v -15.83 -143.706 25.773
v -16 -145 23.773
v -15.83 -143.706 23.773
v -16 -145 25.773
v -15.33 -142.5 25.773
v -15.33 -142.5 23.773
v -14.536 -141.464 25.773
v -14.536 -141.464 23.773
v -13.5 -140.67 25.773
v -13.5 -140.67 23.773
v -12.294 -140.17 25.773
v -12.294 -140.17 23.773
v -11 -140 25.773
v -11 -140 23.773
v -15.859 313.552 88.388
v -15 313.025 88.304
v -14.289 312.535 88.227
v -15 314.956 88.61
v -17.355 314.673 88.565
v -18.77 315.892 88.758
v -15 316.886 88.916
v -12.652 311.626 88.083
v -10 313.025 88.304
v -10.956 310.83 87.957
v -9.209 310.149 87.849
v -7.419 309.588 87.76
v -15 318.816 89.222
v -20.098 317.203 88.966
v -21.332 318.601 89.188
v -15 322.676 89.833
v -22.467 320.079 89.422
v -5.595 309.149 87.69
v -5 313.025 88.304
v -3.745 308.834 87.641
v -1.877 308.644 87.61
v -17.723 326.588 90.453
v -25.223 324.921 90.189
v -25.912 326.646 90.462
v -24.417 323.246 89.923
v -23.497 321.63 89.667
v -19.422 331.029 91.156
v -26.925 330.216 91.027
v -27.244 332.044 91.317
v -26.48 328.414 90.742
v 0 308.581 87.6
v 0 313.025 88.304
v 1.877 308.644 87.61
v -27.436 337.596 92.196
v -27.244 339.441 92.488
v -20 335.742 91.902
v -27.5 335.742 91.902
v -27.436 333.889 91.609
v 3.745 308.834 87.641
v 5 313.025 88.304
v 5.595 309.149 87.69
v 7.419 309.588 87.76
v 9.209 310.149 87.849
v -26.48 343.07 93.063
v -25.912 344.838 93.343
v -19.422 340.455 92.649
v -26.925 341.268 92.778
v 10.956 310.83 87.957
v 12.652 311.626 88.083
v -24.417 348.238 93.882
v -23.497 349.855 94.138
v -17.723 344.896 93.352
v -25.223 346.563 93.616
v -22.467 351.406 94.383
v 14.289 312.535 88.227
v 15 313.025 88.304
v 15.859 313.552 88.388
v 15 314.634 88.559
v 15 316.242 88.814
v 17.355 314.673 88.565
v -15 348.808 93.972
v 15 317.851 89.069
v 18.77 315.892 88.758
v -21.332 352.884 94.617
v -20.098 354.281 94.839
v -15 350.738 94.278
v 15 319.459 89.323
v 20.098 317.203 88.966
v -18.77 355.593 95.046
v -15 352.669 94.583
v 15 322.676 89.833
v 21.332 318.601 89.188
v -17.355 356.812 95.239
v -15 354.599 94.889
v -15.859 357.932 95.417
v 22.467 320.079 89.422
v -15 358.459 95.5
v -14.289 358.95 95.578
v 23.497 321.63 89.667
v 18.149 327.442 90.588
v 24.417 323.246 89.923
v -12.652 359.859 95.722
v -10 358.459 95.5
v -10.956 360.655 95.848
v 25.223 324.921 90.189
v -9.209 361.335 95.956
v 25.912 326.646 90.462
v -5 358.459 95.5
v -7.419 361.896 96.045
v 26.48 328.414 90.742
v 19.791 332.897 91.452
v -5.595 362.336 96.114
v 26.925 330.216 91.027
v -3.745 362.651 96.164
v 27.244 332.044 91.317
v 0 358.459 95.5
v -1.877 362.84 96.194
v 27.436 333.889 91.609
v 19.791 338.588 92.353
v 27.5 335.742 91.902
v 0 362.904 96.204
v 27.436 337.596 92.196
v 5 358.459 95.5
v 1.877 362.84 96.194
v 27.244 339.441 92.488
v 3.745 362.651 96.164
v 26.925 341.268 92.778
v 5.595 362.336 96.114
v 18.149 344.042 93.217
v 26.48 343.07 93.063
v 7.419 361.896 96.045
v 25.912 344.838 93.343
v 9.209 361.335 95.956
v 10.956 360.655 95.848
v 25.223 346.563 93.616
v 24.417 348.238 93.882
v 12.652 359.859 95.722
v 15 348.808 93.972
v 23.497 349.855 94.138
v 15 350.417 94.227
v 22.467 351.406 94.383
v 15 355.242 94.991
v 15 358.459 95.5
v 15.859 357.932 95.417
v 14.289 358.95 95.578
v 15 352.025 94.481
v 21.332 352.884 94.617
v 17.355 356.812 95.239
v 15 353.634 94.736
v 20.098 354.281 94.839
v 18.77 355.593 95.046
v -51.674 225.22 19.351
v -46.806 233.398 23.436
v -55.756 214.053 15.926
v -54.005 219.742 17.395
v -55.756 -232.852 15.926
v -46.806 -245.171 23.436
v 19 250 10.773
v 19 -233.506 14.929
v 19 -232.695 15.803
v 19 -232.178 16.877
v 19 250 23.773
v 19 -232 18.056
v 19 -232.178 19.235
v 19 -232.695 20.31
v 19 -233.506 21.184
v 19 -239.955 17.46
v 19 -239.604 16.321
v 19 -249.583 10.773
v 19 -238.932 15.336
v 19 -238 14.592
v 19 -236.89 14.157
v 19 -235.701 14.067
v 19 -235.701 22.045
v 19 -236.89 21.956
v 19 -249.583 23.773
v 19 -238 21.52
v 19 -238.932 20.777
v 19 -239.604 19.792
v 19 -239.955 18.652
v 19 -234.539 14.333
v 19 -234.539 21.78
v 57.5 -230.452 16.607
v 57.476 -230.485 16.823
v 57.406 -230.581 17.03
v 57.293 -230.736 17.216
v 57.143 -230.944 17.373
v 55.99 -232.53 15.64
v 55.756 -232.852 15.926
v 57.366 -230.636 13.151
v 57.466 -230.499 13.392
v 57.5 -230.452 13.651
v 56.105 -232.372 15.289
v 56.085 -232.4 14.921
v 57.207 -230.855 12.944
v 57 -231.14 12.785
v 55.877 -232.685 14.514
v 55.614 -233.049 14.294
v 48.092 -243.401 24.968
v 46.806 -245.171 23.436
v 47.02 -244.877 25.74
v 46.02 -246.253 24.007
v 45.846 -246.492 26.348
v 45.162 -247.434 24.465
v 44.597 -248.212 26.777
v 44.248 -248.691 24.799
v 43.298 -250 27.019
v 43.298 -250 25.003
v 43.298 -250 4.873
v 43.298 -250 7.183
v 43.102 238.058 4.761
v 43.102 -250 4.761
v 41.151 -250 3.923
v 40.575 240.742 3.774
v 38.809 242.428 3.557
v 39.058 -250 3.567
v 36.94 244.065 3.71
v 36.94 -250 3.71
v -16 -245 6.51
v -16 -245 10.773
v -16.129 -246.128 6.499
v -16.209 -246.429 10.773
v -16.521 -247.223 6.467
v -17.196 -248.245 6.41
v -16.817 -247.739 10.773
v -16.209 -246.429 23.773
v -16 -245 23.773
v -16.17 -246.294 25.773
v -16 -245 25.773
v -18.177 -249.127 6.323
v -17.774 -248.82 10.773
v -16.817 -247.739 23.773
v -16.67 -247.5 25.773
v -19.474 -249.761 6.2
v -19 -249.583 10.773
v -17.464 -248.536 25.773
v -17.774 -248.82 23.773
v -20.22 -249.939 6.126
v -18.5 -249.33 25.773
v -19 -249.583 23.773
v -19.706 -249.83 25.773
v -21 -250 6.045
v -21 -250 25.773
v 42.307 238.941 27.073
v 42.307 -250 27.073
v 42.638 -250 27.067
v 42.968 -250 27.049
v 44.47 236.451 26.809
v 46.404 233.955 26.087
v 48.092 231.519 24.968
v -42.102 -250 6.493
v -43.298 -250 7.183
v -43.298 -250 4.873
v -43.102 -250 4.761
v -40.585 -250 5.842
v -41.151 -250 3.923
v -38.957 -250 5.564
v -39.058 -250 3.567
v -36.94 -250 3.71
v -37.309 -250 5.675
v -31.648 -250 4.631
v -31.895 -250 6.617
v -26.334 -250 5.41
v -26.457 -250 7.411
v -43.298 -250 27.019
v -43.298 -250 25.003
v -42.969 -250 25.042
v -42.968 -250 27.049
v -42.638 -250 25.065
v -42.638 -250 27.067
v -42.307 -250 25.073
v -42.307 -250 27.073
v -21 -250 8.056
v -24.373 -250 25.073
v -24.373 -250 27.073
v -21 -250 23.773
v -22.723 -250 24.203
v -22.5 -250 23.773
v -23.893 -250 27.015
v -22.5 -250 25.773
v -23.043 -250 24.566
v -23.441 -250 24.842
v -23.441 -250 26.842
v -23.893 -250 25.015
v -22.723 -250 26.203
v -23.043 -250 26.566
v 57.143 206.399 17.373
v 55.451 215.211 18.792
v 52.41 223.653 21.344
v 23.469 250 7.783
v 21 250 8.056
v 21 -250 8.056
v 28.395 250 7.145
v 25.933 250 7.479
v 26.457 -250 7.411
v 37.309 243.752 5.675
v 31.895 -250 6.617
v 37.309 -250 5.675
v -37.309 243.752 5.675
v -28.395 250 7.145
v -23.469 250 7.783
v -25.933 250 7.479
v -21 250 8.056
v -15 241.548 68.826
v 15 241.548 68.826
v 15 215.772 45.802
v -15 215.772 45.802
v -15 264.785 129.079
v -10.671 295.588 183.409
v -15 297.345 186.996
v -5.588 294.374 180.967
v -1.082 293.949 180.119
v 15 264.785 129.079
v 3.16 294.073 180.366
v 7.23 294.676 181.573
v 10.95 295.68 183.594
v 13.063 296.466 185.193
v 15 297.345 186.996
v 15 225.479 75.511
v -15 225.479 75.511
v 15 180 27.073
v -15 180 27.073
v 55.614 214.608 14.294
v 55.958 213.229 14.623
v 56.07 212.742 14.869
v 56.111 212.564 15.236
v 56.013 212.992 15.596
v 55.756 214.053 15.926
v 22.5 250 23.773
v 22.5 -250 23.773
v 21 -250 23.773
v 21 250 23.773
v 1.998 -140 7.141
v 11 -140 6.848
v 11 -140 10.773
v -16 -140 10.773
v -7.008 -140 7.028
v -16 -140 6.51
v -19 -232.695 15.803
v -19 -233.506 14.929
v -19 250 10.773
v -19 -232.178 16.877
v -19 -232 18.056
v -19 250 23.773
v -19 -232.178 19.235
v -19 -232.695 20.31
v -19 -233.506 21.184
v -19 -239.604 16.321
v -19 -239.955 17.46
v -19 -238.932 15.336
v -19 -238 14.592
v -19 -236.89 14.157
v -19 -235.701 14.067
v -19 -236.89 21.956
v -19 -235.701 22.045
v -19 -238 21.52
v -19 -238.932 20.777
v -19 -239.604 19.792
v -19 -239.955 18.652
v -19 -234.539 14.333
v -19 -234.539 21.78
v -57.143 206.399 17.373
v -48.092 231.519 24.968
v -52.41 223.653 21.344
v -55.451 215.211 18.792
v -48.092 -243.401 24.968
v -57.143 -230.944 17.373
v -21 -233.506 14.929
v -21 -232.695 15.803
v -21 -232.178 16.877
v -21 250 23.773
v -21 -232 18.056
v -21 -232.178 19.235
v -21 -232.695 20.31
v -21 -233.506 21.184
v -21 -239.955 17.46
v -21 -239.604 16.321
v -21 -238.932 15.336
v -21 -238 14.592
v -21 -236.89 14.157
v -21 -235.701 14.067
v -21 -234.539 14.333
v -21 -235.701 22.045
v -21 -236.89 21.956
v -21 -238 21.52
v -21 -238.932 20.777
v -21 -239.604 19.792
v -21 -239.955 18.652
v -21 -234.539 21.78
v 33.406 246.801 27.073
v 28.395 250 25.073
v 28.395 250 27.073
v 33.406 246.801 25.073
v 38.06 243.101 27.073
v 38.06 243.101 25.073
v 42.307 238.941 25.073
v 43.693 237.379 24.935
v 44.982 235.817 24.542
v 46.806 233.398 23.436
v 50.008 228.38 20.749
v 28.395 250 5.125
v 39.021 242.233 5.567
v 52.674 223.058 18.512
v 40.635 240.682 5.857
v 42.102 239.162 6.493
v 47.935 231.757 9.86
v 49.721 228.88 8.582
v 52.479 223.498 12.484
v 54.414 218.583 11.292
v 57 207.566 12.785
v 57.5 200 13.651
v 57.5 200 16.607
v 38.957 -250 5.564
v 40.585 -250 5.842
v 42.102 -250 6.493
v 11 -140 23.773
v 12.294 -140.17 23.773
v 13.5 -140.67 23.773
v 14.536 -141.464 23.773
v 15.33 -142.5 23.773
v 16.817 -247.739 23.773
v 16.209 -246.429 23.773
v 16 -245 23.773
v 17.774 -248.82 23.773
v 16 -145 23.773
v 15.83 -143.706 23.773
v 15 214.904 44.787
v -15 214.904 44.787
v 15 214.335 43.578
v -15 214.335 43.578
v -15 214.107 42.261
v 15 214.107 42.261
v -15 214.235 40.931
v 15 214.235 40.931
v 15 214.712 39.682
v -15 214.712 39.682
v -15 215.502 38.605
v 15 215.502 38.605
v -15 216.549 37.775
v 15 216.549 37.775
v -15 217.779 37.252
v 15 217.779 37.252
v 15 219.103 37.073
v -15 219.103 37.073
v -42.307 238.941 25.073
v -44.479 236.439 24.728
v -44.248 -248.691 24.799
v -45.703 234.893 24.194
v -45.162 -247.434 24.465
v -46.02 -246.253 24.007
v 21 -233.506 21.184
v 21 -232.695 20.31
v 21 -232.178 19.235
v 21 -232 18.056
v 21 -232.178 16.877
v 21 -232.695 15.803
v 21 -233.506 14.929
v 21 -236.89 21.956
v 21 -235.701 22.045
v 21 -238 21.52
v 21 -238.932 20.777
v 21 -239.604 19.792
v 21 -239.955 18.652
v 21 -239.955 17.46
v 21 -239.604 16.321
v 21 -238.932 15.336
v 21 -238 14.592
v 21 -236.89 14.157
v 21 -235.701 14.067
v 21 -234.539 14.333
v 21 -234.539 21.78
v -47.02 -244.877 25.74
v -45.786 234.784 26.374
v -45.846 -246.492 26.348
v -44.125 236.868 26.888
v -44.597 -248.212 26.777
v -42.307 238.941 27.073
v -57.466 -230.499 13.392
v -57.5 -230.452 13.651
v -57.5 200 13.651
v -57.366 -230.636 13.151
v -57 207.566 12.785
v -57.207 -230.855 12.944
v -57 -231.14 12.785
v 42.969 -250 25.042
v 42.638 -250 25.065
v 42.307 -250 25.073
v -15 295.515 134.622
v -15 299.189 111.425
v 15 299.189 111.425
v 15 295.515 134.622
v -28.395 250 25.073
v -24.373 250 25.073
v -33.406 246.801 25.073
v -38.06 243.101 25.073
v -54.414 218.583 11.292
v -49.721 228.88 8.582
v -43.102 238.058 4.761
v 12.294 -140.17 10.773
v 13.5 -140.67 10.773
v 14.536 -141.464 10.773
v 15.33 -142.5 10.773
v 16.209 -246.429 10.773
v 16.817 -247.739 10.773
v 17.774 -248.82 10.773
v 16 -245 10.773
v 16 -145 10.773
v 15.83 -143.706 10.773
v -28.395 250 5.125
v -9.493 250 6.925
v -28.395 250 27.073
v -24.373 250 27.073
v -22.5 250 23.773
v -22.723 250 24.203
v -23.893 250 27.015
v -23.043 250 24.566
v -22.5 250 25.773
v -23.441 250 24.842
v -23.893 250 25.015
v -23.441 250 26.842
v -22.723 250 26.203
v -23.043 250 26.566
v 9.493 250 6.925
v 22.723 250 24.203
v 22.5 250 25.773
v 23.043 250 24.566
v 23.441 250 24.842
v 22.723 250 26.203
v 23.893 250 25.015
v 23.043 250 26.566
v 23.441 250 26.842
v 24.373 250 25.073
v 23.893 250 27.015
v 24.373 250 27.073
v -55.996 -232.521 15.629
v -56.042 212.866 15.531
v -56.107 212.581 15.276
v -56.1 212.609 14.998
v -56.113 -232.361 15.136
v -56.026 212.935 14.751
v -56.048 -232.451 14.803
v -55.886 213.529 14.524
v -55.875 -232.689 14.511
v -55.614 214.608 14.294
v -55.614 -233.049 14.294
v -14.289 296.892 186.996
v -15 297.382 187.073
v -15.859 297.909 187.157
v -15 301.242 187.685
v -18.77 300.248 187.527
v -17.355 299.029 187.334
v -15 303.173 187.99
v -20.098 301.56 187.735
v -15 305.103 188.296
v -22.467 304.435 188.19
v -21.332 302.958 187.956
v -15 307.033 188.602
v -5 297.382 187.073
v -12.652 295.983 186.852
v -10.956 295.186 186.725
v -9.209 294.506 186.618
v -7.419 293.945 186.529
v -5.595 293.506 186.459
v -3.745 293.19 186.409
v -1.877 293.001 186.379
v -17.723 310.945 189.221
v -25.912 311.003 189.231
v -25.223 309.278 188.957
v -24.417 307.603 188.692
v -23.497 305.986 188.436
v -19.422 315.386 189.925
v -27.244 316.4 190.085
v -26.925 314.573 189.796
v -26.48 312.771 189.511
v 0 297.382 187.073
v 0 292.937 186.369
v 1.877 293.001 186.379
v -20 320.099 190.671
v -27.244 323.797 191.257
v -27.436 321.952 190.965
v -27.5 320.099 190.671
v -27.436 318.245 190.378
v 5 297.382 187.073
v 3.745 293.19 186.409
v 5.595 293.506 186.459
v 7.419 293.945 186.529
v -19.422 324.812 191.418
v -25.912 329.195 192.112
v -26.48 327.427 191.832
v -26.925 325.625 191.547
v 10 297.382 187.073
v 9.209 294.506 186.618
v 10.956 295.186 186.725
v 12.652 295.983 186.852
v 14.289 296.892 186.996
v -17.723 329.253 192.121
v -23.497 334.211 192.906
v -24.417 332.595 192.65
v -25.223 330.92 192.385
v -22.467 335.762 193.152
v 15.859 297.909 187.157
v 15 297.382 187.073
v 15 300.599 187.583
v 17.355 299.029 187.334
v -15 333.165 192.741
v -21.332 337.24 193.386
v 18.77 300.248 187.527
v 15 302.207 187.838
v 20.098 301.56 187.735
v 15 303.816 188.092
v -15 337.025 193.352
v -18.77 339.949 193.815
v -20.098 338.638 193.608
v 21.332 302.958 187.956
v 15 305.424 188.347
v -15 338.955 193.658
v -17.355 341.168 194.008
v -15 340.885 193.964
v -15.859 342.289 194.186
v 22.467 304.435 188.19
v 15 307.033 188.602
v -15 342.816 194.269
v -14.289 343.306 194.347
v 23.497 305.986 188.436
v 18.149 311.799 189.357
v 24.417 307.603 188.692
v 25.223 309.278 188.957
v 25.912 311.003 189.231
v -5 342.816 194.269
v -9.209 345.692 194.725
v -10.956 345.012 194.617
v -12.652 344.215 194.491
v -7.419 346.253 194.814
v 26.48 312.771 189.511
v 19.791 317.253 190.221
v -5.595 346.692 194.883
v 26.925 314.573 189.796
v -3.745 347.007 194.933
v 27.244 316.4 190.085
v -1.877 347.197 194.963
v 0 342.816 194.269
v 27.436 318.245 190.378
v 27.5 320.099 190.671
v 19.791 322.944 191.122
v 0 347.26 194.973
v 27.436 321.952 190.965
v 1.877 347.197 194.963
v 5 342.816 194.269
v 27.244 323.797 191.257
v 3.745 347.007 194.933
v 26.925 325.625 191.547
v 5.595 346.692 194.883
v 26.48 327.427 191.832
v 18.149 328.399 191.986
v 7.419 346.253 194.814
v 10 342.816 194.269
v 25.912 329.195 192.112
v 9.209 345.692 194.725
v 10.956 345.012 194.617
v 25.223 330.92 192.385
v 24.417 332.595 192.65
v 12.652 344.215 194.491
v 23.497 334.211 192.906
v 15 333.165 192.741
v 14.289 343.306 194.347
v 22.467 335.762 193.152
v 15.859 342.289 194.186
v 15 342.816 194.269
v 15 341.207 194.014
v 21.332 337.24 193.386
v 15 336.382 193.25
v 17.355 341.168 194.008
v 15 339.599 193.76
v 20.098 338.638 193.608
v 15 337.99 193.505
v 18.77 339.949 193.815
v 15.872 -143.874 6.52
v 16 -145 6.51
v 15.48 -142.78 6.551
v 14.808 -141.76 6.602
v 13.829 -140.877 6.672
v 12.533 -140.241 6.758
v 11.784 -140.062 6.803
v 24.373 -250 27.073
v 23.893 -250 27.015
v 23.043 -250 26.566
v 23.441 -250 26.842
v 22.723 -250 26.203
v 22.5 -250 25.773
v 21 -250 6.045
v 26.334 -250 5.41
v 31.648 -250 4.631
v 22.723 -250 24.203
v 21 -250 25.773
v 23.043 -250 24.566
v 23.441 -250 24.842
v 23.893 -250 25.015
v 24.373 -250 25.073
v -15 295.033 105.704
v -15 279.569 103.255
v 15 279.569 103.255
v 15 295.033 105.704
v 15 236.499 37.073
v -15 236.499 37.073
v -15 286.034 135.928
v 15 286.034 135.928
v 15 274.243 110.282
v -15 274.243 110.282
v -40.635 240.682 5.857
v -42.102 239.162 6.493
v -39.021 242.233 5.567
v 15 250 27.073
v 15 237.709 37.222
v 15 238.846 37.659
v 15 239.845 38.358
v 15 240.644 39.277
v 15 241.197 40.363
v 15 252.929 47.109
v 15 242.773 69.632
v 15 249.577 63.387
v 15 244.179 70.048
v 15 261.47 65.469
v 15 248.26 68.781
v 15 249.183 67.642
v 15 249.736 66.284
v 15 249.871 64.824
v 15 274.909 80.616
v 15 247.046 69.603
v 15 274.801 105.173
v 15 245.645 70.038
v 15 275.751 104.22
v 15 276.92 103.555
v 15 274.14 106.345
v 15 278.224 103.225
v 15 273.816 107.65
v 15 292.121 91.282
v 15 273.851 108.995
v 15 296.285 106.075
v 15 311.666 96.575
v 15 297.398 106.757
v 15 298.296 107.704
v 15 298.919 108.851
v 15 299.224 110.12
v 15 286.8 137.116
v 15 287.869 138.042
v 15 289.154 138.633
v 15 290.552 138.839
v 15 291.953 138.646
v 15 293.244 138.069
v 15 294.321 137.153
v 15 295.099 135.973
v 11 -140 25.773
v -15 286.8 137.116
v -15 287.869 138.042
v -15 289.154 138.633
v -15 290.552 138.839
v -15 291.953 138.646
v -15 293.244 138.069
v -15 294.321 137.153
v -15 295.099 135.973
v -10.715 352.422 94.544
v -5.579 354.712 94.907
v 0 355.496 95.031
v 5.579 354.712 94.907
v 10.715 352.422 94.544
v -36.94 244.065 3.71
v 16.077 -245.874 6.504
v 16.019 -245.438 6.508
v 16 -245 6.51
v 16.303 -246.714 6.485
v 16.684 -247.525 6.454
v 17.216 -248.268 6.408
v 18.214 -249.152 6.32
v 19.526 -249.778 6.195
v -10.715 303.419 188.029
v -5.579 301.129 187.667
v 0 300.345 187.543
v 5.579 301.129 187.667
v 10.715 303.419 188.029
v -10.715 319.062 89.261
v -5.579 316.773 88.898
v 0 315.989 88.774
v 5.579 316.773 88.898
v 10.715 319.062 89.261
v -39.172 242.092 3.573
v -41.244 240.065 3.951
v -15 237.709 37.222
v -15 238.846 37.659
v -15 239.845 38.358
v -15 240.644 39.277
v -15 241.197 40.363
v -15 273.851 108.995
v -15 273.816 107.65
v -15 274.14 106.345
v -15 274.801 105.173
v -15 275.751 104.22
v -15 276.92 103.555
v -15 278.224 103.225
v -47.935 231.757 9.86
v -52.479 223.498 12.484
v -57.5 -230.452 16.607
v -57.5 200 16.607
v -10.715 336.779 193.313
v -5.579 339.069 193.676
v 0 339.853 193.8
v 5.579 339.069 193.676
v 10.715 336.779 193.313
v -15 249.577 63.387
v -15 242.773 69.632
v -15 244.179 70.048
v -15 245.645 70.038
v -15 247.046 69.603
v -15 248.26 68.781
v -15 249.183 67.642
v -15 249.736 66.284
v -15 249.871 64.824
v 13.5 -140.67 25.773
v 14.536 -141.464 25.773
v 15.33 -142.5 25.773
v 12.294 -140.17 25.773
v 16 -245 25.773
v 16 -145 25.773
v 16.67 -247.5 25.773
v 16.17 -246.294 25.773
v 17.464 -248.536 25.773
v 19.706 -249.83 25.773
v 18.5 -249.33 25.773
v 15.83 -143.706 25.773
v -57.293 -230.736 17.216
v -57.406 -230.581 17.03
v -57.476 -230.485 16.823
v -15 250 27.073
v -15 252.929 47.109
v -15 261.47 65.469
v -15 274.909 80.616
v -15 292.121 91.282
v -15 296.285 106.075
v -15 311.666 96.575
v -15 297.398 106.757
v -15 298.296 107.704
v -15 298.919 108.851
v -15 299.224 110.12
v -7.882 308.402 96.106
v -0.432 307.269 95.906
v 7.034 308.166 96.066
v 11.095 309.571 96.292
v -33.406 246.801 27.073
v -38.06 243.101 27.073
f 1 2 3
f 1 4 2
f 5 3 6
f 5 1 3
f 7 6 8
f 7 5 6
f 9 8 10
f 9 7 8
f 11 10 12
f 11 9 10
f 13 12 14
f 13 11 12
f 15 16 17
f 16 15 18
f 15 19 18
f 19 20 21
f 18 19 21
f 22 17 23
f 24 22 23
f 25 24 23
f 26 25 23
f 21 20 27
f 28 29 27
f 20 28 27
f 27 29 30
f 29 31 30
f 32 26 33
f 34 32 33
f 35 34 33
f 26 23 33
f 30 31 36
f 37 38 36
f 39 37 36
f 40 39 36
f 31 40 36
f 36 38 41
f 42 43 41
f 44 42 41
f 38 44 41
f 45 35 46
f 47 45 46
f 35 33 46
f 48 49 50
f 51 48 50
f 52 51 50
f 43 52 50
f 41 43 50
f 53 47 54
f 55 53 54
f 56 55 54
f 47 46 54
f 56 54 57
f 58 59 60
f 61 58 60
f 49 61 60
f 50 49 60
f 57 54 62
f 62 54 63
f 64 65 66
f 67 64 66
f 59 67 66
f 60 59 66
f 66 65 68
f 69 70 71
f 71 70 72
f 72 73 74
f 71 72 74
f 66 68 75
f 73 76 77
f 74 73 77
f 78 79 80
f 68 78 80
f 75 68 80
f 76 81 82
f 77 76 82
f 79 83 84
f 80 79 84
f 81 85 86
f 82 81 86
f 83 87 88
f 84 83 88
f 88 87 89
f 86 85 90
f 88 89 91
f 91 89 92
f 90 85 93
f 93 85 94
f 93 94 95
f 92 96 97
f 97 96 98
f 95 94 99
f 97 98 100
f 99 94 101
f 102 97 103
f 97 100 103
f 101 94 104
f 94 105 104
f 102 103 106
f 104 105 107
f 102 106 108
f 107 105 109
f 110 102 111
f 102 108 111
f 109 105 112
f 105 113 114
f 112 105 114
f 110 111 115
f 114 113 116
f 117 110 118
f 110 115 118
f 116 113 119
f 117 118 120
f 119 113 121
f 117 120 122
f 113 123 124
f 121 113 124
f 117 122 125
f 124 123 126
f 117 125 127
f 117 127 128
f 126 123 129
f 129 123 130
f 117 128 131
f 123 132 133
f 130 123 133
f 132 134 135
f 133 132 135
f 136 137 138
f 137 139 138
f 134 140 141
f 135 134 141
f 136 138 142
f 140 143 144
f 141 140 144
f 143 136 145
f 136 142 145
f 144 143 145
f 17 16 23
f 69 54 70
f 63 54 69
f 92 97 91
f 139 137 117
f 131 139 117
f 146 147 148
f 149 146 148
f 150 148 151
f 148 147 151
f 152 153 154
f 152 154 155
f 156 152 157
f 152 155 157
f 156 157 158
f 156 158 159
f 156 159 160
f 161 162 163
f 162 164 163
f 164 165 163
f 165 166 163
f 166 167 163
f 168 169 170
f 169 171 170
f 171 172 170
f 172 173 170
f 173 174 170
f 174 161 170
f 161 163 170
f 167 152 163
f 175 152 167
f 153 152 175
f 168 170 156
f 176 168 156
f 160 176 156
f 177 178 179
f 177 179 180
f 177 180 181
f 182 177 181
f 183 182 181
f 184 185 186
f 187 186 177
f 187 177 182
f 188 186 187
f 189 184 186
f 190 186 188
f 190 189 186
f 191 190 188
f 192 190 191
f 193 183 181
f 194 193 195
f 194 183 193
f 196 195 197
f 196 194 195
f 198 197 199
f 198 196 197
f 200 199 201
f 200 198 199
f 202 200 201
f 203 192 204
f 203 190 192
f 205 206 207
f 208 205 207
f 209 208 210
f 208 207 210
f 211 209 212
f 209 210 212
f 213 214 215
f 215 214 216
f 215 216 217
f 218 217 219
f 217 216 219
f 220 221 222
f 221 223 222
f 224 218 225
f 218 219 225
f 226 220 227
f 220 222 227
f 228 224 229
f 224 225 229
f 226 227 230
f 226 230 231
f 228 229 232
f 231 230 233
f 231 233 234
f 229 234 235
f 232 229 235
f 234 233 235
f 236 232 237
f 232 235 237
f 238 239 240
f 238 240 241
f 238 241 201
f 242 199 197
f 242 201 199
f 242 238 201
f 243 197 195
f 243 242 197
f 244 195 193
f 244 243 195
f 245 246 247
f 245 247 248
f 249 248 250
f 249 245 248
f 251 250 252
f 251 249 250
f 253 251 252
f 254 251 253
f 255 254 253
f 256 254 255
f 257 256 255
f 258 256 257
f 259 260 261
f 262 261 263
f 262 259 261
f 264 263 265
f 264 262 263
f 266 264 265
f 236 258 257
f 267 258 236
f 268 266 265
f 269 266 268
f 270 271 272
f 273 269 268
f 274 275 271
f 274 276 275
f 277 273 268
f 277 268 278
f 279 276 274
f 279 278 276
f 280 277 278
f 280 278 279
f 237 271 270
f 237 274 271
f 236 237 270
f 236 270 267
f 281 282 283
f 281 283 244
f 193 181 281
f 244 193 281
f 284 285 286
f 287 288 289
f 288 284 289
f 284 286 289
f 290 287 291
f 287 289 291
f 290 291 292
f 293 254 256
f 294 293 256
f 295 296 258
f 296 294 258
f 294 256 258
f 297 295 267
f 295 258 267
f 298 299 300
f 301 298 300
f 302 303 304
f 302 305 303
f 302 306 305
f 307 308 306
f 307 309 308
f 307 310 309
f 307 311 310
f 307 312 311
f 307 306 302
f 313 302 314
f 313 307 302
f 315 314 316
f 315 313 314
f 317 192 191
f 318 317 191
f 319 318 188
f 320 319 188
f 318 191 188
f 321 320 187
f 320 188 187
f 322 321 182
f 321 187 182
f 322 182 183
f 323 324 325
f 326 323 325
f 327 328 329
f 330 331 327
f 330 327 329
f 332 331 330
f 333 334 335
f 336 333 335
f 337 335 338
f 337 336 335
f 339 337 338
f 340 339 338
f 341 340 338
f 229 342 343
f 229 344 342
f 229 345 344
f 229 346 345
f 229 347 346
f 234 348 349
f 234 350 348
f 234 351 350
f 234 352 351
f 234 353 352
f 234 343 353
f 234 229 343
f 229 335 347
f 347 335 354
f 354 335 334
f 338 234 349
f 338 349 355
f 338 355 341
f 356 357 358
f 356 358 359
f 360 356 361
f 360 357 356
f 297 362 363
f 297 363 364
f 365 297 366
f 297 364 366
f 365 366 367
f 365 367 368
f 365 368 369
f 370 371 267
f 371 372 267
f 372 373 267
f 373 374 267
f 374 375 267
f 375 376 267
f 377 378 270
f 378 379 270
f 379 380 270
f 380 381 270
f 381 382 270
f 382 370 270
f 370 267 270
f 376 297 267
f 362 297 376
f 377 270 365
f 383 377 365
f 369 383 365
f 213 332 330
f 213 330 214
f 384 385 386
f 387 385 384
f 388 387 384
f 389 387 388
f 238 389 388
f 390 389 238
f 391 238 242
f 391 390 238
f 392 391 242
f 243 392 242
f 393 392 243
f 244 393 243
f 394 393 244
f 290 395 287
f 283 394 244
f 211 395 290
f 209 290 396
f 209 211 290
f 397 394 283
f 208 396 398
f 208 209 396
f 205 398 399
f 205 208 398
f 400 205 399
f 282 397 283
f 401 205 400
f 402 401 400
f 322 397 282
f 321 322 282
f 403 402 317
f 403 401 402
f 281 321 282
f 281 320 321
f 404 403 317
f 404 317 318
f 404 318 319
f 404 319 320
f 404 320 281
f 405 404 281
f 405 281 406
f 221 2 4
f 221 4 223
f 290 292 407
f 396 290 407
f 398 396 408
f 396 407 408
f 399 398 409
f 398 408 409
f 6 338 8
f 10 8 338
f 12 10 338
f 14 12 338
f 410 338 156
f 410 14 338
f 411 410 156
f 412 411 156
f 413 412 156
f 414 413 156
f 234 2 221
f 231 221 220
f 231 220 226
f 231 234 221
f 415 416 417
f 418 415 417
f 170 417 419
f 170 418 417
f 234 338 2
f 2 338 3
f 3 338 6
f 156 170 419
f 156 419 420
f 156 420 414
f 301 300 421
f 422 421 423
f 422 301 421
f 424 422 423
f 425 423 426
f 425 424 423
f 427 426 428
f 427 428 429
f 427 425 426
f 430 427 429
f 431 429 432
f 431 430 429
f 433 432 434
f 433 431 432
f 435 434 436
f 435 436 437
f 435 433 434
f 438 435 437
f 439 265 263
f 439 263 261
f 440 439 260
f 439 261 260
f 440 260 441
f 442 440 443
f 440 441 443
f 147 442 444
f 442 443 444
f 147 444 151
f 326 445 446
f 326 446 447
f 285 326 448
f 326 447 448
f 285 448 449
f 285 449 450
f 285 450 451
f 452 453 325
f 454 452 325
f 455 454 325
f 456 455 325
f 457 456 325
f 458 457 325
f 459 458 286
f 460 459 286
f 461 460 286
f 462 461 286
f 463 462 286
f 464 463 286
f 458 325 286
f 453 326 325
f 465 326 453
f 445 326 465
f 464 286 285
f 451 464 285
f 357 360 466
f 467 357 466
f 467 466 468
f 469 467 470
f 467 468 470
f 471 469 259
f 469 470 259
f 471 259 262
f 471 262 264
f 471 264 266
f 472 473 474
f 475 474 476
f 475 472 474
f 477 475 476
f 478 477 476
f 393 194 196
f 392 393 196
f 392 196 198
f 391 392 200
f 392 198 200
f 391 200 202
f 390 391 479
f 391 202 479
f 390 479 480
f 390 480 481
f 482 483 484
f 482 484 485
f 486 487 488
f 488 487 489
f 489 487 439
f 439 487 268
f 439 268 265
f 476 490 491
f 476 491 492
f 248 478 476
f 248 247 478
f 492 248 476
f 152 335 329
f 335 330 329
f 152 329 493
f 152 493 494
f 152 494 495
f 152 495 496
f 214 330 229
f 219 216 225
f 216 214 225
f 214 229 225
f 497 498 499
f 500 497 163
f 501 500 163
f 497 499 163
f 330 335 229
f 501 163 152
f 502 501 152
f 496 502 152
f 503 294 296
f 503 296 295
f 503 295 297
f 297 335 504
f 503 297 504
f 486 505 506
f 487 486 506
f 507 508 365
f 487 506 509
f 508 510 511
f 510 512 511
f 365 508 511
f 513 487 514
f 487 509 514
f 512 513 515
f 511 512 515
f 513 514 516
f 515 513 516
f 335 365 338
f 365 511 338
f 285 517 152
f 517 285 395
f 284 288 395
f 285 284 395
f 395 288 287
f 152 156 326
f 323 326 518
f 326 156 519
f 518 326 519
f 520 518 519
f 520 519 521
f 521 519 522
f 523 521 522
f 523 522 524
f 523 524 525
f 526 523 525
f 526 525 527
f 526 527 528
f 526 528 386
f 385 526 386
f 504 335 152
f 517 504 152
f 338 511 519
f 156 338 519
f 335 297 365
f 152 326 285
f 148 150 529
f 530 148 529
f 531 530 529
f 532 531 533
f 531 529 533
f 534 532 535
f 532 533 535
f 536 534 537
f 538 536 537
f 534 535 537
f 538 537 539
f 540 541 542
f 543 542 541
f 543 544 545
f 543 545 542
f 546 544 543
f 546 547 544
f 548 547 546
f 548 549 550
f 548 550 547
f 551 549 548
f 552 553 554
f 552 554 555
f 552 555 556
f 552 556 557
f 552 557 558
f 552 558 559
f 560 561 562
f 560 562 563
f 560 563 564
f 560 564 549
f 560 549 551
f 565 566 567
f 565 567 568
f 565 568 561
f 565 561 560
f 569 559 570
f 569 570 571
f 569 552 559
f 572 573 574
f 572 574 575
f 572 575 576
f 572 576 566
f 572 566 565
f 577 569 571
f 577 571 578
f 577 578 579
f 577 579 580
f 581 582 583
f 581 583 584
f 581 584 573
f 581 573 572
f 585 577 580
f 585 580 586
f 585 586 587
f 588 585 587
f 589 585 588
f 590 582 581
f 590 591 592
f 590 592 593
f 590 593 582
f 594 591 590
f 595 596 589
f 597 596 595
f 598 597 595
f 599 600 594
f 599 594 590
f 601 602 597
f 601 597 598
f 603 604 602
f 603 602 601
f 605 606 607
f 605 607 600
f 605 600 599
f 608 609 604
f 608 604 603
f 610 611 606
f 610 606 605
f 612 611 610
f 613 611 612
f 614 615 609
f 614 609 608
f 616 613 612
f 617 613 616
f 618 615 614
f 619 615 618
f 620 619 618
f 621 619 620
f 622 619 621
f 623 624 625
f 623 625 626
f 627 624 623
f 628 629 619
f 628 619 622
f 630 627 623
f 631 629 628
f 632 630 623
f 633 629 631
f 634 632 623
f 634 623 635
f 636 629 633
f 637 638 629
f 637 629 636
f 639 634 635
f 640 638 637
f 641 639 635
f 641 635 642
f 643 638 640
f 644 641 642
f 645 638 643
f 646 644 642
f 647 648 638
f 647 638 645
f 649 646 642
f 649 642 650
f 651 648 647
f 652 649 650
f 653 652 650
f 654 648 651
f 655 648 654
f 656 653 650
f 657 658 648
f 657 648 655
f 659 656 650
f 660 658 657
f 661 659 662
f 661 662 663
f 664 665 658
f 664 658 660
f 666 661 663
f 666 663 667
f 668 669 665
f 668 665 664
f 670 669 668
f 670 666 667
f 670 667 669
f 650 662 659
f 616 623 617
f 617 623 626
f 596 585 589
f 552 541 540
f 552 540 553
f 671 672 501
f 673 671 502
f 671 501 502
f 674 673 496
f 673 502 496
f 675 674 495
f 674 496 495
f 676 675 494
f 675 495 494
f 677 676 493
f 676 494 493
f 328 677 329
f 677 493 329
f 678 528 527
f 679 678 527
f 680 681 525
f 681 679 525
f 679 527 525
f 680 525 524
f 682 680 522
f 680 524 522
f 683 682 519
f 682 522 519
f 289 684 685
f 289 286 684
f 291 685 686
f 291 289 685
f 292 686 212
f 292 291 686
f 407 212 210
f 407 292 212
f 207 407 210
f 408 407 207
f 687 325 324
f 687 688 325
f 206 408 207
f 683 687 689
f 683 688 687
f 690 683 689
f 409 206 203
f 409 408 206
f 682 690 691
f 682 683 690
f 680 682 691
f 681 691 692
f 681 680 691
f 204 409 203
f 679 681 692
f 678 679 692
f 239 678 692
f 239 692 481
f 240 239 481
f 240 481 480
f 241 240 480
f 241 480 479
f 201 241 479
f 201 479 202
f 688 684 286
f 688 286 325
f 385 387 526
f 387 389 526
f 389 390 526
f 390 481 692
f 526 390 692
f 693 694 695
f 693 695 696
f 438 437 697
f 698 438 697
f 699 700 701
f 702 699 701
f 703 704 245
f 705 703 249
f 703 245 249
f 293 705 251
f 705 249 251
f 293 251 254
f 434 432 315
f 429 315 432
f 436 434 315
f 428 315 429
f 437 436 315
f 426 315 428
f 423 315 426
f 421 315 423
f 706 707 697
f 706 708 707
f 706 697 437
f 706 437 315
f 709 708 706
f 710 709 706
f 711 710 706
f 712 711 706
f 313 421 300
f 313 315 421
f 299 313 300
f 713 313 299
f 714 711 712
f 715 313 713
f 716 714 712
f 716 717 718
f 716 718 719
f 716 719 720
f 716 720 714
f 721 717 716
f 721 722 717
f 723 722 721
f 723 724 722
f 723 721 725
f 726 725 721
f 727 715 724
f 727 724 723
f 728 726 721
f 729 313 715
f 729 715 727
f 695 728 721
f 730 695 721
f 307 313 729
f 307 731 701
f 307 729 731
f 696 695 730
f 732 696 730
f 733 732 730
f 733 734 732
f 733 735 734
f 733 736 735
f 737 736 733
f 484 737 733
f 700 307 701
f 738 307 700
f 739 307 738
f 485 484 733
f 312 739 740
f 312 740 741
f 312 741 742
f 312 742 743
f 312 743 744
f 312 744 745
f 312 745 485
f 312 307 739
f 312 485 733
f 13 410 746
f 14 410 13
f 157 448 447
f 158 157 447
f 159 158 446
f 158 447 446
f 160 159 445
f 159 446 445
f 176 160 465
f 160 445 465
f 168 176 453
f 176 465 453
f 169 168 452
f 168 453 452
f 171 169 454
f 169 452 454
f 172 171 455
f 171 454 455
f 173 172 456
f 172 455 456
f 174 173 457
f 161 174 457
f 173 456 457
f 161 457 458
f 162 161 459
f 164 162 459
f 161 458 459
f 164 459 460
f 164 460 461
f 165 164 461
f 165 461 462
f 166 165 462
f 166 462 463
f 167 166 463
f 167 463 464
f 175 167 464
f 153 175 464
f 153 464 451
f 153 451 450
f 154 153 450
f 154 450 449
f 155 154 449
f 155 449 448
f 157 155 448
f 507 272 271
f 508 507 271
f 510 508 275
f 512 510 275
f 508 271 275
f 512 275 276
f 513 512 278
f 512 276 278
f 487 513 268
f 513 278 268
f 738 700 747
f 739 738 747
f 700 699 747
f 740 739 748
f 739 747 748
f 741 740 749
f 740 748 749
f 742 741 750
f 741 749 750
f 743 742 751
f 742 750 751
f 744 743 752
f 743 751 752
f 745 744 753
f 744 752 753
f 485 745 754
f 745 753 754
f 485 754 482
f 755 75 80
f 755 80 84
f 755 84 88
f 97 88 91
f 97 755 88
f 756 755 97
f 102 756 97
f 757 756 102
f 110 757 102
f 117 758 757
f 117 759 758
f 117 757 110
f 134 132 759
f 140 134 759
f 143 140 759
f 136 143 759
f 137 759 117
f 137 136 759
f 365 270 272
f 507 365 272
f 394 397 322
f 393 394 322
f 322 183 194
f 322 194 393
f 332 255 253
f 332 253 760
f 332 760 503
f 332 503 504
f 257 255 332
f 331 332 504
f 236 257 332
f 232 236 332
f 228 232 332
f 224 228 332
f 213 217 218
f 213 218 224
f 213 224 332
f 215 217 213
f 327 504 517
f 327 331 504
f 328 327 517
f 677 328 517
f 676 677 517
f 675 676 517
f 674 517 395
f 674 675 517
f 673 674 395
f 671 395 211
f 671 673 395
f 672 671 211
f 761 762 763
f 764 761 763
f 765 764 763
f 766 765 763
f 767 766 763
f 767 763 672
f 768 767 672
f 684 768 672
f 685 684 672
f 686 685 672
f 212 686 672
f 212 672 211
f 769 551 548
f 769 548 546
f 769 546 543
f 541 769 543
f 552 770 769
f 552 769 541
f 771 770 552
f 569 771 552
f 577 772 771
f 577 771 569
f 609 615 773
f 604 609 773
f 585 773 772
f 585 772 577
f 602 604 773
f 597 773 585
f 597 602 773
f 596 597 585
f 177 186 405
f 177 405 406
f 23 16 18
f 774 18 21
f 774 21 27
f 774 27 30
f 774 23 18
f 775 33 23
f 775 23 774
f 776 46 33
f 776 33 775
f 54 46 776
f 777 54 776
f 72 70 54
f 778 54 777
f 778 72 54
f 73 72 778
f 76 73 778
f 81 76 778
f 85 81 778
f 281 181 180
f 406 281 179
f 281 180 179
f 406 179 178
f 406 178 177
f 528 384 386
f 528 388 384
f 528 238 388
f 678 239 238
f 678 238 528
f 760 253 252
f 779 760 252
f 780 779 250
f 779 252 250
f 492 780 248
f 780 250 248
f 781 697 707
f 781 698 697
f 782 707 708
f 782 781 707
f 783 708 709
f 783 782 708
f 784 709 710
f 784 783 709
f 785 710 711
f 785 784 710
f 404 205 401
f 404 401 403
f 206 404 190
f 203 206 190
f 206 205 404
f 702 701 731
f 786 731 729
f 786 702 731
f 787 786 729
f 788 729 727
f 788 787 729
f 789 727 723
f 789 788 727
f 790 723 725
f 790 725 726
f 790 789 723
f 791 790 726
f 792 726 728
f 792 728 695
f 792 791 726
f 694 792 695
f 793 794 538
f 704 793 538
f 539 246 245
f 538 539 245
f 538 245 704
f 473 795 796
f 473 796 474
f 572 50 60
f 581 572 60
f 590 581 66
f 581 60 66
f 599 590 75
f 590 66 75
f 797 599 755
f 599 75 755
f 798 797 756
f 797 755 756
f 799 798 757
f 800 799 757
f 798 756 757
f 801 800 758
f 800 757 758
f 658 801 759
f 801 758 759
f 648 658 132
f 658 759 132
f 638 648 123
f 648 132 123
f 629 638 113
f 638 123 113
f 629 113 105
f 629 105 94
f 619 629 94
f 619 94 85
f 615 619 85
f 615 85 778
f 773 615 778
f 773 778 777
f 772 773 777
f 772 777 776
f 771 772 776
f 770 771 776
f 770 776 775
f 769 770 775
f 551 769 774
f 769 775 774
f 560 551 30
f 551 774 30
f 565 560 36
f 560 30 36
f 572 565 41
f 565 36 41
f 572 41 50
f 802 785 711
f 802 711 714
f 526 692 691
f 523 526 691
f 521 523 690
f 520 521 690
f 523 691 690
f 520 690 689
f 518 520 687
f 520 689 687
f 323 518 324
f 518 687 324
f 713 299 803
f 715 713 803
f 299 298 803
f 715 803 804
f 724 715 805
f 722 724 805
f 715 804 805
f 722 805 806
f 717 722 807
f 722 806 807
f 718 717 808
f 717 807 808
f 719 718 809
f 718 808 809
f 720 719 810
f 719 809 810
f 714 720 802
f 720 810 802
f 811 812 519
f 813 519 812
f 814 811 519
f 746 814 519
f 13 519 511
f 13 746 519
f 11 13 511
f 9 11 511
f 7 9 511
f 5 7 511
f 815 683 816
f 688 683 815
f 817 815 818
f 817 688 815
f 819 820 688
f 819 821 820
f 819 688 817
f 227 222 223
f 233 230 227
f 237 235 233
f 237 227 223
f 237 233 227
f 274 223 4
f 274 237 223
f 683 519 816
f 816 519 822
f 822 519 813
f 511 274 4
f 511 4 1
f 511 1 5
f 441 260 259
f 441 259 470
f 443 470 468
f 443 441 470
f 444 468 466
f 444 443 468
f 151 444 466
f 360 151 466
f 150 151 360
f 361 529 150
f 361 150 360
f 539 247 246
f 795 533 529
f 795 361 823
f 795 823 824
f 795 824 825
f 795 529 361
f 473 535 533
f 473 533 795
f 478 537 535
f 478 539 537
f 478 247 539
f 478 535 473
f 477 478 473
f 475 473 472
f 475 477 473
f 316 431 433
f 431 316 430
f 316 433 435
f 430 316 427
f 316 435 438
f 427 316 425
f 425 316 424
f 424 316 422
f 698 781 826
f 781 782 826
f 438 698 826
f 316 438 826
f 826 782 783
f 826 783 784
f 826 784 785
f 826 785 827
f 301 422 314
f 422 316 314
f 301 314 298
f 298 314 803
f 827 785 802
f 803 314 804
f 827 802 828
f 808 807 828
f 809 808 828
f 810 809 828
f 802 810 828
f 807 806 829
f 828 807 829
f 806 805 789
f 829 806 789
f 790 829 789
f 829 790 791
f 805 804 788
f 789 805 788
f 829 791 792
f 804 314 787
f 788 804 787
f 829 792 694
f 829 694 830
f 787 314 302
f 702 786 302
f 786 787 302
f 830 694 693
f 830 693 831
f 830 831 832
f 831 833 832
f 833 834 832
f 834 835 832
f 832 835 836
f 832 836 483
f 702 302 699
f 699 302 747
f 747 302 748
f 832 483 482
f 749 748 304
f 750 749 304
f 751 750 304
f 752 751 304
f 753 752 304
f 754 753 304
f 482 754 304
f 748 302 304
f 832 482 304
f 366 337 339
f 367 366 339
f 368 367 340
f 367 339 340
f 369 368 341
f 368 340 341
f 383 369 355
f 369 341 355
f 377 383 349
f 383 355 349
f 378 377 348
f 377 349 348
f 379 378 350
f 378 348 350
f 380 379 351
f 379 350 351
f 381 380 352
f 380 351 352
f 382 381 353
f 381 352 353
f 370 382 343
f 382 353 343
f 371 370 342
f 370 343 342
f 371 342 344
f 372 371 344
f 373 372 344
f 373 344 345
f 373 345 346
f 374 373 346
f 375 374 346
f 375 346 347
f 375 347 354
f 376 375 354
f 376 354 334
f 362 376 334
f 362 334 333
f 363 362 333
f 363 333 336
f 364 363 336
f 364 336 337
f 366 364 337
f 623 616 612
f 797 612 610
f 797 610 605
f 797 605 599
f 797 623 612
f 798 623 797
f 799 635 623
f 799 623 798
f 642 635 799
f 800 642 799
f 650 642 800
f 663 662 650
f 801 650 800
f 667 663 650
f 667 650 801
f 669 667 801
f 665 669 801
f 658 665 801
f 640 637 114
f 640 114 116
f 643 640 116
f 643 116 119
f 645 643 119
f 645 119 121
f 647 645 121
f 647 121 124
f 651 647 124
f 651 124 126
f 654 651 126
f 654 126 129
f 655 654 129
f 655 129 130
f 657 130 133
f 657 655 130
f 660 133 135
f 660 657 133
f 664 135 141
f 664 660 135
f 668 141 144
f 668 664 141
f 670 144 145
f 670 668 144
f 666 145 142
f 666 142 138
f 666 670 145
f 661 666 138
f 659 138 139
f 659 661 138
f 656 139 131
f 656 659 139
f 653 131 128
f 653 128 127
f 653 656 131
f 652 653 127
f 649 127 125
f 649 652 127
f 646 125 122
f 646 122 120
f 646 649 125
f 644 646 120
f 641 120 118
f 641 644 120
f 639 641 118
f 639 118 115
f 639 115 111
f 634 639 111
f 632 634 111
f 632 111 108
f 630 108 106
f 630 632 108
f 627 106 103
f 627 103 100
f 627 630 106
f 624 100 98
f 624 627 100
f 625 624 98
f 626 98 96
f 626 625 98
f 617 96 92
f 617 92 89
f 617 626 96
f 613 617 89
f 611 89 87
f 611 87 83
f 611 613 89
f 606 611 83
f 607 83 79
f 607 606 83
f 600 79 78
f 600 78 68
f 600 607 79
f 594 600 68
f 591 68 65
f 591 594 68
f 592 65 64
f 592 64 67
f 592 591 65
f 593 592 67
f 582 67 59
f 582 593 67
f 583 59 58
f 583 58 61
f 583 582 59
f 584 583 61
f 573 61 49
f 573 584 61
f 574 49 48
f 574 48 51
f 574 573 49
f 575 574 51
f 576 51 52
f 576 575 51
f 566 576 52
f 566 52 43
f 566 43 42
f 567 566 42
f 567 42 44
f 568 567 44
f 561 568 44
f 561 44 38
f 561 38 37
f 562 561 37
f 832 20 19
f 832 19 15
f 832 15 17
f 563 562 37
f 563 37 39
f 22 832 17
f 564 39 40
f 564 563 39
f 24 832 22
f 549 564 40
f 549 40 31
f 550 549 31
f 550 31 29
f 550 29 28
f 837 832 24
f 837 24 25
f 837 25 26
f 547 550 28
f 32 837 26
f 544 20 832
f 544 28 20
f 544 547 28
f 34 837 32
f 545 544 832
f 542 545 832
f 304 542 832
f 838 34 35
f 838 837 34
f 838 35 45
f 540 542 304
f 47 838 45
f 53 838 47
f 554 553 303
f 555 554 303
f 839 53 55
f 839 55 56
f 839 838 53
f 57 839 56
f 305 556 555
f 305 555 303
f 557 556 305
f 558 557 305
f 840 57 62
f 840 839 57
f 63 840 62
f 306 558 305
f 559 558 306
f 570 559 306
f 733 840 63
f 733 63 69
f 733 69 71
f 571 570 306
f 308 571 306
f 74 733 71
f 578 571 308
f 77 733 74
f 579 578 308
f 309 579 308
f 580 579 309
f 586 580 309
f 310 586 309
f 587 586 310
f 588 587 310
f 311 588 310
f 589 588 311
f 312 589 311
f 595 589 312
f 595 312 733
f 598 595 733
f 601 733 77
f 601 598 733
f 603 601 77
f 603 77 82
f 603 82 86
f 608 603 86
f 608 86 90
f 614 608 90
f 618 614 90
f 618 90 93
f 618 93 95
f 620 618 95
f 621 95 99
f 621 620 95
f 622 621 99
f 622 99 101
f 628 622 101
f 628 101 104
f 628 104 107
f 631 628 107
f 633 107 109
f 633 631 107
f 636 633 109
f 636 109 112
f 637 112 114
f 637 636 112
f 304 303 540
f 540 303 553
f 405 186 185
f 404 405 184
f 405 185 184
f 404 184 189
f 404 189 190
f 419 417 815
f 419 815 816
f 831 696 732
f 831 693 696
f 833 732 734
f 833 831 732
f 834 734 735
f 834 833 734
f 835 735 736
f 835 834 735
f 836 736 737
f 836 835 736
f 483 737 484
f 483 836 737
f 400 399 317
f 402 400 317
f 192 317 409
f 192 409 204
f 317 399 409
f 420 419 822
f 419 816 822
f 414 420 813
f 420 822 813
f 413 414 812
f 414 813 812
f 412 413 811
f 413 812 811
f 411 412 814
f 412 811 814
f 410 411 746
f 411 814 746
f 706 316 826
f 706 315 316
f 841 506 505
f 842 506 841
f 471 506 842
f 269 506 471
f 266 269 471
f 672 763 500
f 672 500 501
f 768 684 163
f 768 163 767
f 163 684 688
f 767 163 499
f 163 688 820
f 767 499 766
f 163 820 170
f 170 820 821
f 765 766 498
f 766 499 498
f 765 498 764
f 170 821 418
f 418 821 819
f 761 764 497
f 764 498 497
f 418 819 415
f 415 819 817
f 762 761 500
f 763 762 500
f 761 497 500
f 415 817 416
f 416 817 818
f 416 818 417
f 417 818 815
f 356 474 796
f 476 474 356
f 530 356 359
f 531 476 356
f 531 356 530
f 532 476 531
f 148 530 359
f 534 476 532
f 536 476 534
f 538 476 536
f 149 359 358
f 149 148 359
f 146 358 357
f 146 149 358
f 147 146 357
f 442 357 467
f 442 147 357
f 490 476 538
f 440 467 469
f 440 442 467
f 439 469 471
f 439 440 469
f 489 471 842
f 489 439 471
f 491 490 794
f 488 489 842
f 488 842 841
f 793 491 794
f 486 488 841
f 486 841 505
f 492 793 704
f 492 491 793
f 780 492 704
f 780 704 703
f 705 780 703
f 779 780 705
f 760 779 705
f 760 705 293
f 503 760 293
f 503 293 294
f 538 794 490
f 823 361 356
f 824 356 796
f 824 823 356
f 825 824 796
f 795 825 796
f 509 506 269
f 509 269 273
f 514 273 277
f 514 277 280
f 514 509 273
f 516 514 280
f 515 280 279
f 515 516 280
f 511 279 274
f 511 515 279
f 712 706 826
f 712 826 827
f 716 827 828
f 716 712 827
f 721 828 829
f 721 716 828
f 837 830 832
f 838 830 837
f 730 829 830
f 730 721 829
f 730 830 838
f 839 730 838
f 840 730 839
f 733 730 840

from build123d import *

# Parameters (mm, degrees)
F1_DEPTH       = 250
F2_W           = 38
F2_H           = 13
F3_DEPTH       = 250
F4_T1_DEPTH    = 509.3674969976
F5_R           = 9
F6_R           = 1
F8_DEPTH       = 500.001
F10_DEPTH      = 529
F10_DEPTH_BACK = 27.0742567341
F12_DEPTH      = 27.0742568341
F12_DEPTH_BACK = 530
F13_F1_R       = 4.9999
F13_F2_R       = 5
F13_F3_R       = 5
F13_F4_R       = 4.9999
F13_F5_R       = 5
F15_DEPTH      = 15
F16_R          = 27.5
F17_DEPTH      = 100
F19_D          = 40
F21_D          = 8
F21_DEPTH      = 66
F21_TIP        = 2.4034424761
F23_DEPTH      = 72.5010001
F24_R          = 5


# Not quite as in the source:
# - a fillet or chamfer that OpenCascade refuses, or shapes differently, is made with other operations: its cross-section is extruded or revolved along the edge and cut away or added
# - a fillet or chamfer is up to 0.001 mm smaller than in the source, because OpenCascade refuses the exact size
# - an extrude ends at something that could not be found from the text; its depth is read off the source's solid


with BuildPart() as f1:
    # F0 (on Front) → F1 (new body, symmetric)
    with BuildSketch(Plane.XZ):
        with BuildLine():
            Line((22.5, 25.7732567341), (0, 25.7732567341))
            Line((0, 25.7732567341), (-22.5, 25.7732567341))
            Line((-22.5, 25.7732567341), (-22.5, 27.0732567341))
            Line((-22.5, 27.0732567341), (-45.5824640741, 27.0732567341))
            Line((-45.5824640741, 27.0732567341), (-57.5, 17.0732567341))
            Line((-57.5, 17.0732567341), (-57.5, 13.0732567341))
            Line((-57.5, 13.0732567341), (-40.1794919243, 3.0732567341))
            ThreePointArc((-40.1794919243, 3.0732567341), (0, 7.1508015925), (40.1794919243, 3.0732567341))
            Line((40.1794919243, 3.0732567341), (57.5, 13.0732567341))
            Line((57.5, 13.0732567341), (57.5, 17.0732567341))
            Line((57.5, 17.0732567341), (45.5824640741, 27.0732567341))
            Line((45.5824640741, 27.0732567341), (22.5, 27.0732567341))
            Line((22.5, 27.0732567341), (22.5, 25.7732567341))
        make_face()
    extrude(amount=F1_DEPTH, both=True)

    # F2 (on Front) → F3 (cut, symmetric)
    with BuildSketch(Plane.XZ):
        with Locations((0, 17.2732567341)):
            Rectangle(F2_W, F2_H)
    extrude(amount=F3_DEPTH, both=True, mode=Mode.SUBTRACT)

    # F4: fillet of radius 2 on 2 edges, made by hand

    # F4_s2 → F4_t1 (cut)
    with BuildSketch(Plane.XZ.offset(-254.6837484988)):
        with BuildLine():
            ThreePointArc((-24.3734993995, 27.0732567341), (-23.2333239744, 26.7164244066), (-22.5, 25.7732567341))
            Line((-22.5, 25.7732567341), (-22.5, 27.0732567341))
            Line((-22.5, 27.0732567341), (-24.3734993995, 27.0732567341))
        make_face()
        with BuildLine():
            ThreePointArc((24.3734993995, 27.0732567341), (23.2333239744, 26.7164244066), (22.5, 25.7732567341))
            Line((22.5, 25.7732567341), (22.5, 27.0732567341))
            Line((22.5, 27.0732567341), (24.3734993995, 27.0732567341))
        make_face()
    extrude(amount=F4_T1_DEPTH, mode=Mode.SUBTRACT)

    # F5
    f5_edges = [f1.edges().sort_by_distance(p)[0] for p in [
        (-45.582464, 0, 27.073257),
        (45.582464, 0, 27.073257),
        (40.179492, 0, 3.073257),
        (-40.179492, 0, 3.073257),
    ]]
    fillet(f5_edges, radius=F5_R)

    # F6
    f6_edges = [f1.edges().sort_by_distance(p)[0] for p in [
        (57.5, 0, 17.073257),
        (57.5, 0, 13.073257),
        (-57.5, 0, 17.073257),
        (-57.5, 0, 13.073257),
    ]]
    fillet(f6_edges, radius=F6_R)

    # F7 (on face) → F8 (cut, through all)
    with BuildSketch(Plane.XZ.offset(250)):
        with BuildLine():
            ThreePointArc((-37.3093701274, 5.6753867217), (-29.1789785809, 7.0322344696), (-21, 8.0562519915))
            Line((-21, 8.0562519915), (-21, 10.7732567341))
            Line((-21, 10.7732567341), (-21, 23.7732567341))
            Line((-21, 23.7732567341), (-22.5, 23.7732567341))
            ThreePointArc((-22.5, 23.7732567341), (-23.2333239744, 24.7164244066), (-24.3734993995, 25.0732567341))
            Line((-24.3734993995, 25.0732567341), (-42.3067319657, 25.0732567341))
            ThreePointArc((-42.3067319657, 25.0732567341), (-44.7008729689, 24.6511050796), (-46.8062452335, 23.435567836))
            Line((-46.8062452335, 23.435567836), (-55.7563117574, 15.9255703167))
            ThreePointArc((-55.7563117574, 15.9255703167), (-56.1097188459, 15.0723701308), (-55.6135241478, 14.2935004698))
            Line((-55.6135241478, 14.2935004698), (-42.1022690923, 6.4927737264))
            ThreePointArc((-42.1022690923, 6.4927737264), (-39.7790673433, 5.6545786734), (-37.3093701274, 5.6753867217))
        make_face()
        with BuildLine():
            Line((42.3067319657, 25.0732567341), (24.3734993995, 25.0732567341))
            ThreePointArc((24.3734993995, 25.0732567341), (23.2333239744, 24.7164244066), (22.5, 23.7732567341))
            Line((22.5, 23.7732567341), (21, 23.7732567341))
            Line((21, 23.7732567341), (21, 10.7732567341))
            Line((21, 10.7732567341), (21, 8.0562519915))
            ThreePointArc((21, 8.0562519915), (29.1789785809, 7.0322344696), (37.3093701274, 5.6753867217))
            ThreePointArc((37.3093701274, 5.6753867217), (39.7790673433, 5.6545786734), (42.1022690923, 6.4927737264))
            Line((42.1022690923, 6.4927737264), (55.6135241478, 14.2935004698))
            ThreePointArc((55.6135241478, 14.2935004698), (56.1097188459, 15.0723701308), (55.7563117574, 15.9255703167))
            Line((55.7563117574, 15.9255703167), (46.8062452335, 23.435567836))
            ThreePointArc((46.8062452335, 23.435567836), (44.7008729689, 24.6511050796), (42.3067319657, 25.0732567341))
        make_face()
    extrude(amount=-F8_DEPTH, mode=Mode.SUBTRACT)

    # F9 (on Top) → F10 (cut, two sides)
    with BuildSketch(Plane.XY) as f10_sk:
        with BuildLine():
            ThreePointArc((-57.5, 200), (0, 257.5), (57.5, 200))
            Line((57.5, 200), (57.5, 280))
            Line((57.5, 280), (-57.5, 280))
            Line((-57.5, 280), (-57.5, 200))
        make_face()
    extrude(amount=-F10_DEPTH, mode=Mode.SUBTRACT)
    extrude(f10_sk.sketch, amount=F10_DEPTH_BACK, mode=Mode.SUBTRACT)

    # F11 (on Top) → F12 (cut, two sides)
    with BuildSketch(Plane.XY) as f12_sk:
        Polygon((-43.2975540478, -250), (-68, -216), (-68, -346), (68, -346), (68, -216), (43.2975540478, -250), (16, -250), (16, -140), (-16, -140), (-16, -250), align=None)
    extrude(amount=F12_DEPTH, mode=Mode.SUBTRACT)
    extrude(f12_sk.sketch, amount=-F12_DEPTH_BACK, mode=Mode.SUBTRACT)

    # F13: fillet of radius 5 on 7 edges, made by hand

    # F13_f1 (radius 5 in the source; OpenCascade refuses exactly that, so slightly less here)
    f13_f1_edges = [f1.edges().sort_by_distance(p)[0] for p in [
        (16, -250, 8.6415155184),
    ]]
    fillet(f13_f1_edges, radius=F13_F1_R)

    # F13_f2
    f13_f2_edges = [f1.edges().sort_by_distance(p)[0] for p in [
        (16, -140, 8.6415155184),
    ]]
    fillet(f13_f2_edges, radius=F13_F2_R)

    # F13_f3
    f13_f3_edges = [f1.edges().sort_by_distance(p)[0] for p in [
        (16, -140, 24.7732567341),
    ]]
    fillet(f13_f3_edges, radius=F13_F3_R)

    # F13_f4 (radius 5 in the source; OpenCascade refuses exactly that, so slightly less here)
    f13_f4_edges = [f1.edges().sort_by_distance(p)[0] for p in [
        (-16, -250, 24.7732567341),
    ]]
    fillet(f13_f4_edges, radius=F13_F4_R)

    # F13_f5
    f13_f5_edges = [f1.edges().sort_by_distance(p)[0] for p in [
        (-16, -140, 24.7732567341),
    ]]
    fillet(f13_f5_edges, radius=F13_F5_R)

    # F21 (one way)
    with BuildSketch(Plane.YZ.offset(21)):
        with Locations((-236, 18.0562519915)):
            Circle(F21_D / 2)
    extrude(amount=-F21_DEPTH, mode=Mode.SUBTRACT)
    with Locations(Plane.YZ.offset(21)):
        with Locations((-236, 18.0562519915)):
            with Locations((0, 0, -(F21_DEPTH + F21_TIP / 2))):  # 118° drill point
                Cone(0, F21_D / 2, F21_TIP, mode=Mode.SUBTRACT)


with BuildPart() as f15:
    # F14 (on Right) → F15 (new body, symmetric)
    with BuildSketch(Plane.YZ):
        with BuildLine():
            Line((180, 27.0732567341), (250, 27.0732567341))
            ThreePointArc((250, 27.0732567341), (267.6550746197, 73.5491514208), (311.7145367693, 96.5811778586))
            Line((311.7145367693, 96.5811778586), (313.0254460068, 88.3044226746))
            Line((313.0254460068, 88.3044226746), (358.4591096742, 95.5004080665))
            Line((358.4591096742, 95.5004080665), (342.8156631702, 194.269242126))
            Line((342.8156631702, 194.269242126), (297.3819995028, 187.0732567341))
            ThreePointArc((297.3819995028, 187.0732567341), (245.9666940414, 101.7355345871), (180, 27.0732567341))
        make_face()
    extrude(amount=F15_DEPTH, both=True)

    # F16 (on face) → F17 (join, through all)
    with BuildSketch(Plane(origin=(0, -21.6269522386, 136.547202454), x_dir=(1, 0, 0), z_dir=(0, -0.156434465, 0.9876883406))):
        with Locations((0, 345.9854384523)):
            Circle(F16_R)
    extrude(amount=-F17_DEPTH)

    # F19 (through all)
    with Locations(Plane(origin=(0, -21.6269522386, 136.547202454), x_dir=(1, 0, 0), z_dir=(0, -0.156434465, 0.9876883406))):
        with Locations((0, 345.9854384523)):
            Hole(F19_D / 2)

    # F22 (on face) → F23 (cut, through all)
    with BuildSketch(Plane.YZ.offset(15)):
        Polygon((256.378660542, 82.0732567341), (206, 37.0732567341), (240, 37.0732567341), align=None)
        Polygon((292.9320627918, 150.9321765961), (270.3409635007, 101.7931673181), (299.9716137186, 106.4862012693), align=None)
    extrude(amount=-F23_DEPTH, mode=Mode.SUBTRACT)

    # F24
    f24_edges = [f15.edges().sort_by_distance(p)[0] for p in [
        (0, 292.932063, 150.932177),
        (0, 270.340964, 101.793167),
        (0, 299.971614, 106.486201),
        (0, 240, 37.073257),
        (0, 256.378661, 82.073257),
        (0, 206, 37.073257),
    ]]
    fillet(f24_edges, radius=F24_R)


solid = Compound([f1.part, f15.part])
